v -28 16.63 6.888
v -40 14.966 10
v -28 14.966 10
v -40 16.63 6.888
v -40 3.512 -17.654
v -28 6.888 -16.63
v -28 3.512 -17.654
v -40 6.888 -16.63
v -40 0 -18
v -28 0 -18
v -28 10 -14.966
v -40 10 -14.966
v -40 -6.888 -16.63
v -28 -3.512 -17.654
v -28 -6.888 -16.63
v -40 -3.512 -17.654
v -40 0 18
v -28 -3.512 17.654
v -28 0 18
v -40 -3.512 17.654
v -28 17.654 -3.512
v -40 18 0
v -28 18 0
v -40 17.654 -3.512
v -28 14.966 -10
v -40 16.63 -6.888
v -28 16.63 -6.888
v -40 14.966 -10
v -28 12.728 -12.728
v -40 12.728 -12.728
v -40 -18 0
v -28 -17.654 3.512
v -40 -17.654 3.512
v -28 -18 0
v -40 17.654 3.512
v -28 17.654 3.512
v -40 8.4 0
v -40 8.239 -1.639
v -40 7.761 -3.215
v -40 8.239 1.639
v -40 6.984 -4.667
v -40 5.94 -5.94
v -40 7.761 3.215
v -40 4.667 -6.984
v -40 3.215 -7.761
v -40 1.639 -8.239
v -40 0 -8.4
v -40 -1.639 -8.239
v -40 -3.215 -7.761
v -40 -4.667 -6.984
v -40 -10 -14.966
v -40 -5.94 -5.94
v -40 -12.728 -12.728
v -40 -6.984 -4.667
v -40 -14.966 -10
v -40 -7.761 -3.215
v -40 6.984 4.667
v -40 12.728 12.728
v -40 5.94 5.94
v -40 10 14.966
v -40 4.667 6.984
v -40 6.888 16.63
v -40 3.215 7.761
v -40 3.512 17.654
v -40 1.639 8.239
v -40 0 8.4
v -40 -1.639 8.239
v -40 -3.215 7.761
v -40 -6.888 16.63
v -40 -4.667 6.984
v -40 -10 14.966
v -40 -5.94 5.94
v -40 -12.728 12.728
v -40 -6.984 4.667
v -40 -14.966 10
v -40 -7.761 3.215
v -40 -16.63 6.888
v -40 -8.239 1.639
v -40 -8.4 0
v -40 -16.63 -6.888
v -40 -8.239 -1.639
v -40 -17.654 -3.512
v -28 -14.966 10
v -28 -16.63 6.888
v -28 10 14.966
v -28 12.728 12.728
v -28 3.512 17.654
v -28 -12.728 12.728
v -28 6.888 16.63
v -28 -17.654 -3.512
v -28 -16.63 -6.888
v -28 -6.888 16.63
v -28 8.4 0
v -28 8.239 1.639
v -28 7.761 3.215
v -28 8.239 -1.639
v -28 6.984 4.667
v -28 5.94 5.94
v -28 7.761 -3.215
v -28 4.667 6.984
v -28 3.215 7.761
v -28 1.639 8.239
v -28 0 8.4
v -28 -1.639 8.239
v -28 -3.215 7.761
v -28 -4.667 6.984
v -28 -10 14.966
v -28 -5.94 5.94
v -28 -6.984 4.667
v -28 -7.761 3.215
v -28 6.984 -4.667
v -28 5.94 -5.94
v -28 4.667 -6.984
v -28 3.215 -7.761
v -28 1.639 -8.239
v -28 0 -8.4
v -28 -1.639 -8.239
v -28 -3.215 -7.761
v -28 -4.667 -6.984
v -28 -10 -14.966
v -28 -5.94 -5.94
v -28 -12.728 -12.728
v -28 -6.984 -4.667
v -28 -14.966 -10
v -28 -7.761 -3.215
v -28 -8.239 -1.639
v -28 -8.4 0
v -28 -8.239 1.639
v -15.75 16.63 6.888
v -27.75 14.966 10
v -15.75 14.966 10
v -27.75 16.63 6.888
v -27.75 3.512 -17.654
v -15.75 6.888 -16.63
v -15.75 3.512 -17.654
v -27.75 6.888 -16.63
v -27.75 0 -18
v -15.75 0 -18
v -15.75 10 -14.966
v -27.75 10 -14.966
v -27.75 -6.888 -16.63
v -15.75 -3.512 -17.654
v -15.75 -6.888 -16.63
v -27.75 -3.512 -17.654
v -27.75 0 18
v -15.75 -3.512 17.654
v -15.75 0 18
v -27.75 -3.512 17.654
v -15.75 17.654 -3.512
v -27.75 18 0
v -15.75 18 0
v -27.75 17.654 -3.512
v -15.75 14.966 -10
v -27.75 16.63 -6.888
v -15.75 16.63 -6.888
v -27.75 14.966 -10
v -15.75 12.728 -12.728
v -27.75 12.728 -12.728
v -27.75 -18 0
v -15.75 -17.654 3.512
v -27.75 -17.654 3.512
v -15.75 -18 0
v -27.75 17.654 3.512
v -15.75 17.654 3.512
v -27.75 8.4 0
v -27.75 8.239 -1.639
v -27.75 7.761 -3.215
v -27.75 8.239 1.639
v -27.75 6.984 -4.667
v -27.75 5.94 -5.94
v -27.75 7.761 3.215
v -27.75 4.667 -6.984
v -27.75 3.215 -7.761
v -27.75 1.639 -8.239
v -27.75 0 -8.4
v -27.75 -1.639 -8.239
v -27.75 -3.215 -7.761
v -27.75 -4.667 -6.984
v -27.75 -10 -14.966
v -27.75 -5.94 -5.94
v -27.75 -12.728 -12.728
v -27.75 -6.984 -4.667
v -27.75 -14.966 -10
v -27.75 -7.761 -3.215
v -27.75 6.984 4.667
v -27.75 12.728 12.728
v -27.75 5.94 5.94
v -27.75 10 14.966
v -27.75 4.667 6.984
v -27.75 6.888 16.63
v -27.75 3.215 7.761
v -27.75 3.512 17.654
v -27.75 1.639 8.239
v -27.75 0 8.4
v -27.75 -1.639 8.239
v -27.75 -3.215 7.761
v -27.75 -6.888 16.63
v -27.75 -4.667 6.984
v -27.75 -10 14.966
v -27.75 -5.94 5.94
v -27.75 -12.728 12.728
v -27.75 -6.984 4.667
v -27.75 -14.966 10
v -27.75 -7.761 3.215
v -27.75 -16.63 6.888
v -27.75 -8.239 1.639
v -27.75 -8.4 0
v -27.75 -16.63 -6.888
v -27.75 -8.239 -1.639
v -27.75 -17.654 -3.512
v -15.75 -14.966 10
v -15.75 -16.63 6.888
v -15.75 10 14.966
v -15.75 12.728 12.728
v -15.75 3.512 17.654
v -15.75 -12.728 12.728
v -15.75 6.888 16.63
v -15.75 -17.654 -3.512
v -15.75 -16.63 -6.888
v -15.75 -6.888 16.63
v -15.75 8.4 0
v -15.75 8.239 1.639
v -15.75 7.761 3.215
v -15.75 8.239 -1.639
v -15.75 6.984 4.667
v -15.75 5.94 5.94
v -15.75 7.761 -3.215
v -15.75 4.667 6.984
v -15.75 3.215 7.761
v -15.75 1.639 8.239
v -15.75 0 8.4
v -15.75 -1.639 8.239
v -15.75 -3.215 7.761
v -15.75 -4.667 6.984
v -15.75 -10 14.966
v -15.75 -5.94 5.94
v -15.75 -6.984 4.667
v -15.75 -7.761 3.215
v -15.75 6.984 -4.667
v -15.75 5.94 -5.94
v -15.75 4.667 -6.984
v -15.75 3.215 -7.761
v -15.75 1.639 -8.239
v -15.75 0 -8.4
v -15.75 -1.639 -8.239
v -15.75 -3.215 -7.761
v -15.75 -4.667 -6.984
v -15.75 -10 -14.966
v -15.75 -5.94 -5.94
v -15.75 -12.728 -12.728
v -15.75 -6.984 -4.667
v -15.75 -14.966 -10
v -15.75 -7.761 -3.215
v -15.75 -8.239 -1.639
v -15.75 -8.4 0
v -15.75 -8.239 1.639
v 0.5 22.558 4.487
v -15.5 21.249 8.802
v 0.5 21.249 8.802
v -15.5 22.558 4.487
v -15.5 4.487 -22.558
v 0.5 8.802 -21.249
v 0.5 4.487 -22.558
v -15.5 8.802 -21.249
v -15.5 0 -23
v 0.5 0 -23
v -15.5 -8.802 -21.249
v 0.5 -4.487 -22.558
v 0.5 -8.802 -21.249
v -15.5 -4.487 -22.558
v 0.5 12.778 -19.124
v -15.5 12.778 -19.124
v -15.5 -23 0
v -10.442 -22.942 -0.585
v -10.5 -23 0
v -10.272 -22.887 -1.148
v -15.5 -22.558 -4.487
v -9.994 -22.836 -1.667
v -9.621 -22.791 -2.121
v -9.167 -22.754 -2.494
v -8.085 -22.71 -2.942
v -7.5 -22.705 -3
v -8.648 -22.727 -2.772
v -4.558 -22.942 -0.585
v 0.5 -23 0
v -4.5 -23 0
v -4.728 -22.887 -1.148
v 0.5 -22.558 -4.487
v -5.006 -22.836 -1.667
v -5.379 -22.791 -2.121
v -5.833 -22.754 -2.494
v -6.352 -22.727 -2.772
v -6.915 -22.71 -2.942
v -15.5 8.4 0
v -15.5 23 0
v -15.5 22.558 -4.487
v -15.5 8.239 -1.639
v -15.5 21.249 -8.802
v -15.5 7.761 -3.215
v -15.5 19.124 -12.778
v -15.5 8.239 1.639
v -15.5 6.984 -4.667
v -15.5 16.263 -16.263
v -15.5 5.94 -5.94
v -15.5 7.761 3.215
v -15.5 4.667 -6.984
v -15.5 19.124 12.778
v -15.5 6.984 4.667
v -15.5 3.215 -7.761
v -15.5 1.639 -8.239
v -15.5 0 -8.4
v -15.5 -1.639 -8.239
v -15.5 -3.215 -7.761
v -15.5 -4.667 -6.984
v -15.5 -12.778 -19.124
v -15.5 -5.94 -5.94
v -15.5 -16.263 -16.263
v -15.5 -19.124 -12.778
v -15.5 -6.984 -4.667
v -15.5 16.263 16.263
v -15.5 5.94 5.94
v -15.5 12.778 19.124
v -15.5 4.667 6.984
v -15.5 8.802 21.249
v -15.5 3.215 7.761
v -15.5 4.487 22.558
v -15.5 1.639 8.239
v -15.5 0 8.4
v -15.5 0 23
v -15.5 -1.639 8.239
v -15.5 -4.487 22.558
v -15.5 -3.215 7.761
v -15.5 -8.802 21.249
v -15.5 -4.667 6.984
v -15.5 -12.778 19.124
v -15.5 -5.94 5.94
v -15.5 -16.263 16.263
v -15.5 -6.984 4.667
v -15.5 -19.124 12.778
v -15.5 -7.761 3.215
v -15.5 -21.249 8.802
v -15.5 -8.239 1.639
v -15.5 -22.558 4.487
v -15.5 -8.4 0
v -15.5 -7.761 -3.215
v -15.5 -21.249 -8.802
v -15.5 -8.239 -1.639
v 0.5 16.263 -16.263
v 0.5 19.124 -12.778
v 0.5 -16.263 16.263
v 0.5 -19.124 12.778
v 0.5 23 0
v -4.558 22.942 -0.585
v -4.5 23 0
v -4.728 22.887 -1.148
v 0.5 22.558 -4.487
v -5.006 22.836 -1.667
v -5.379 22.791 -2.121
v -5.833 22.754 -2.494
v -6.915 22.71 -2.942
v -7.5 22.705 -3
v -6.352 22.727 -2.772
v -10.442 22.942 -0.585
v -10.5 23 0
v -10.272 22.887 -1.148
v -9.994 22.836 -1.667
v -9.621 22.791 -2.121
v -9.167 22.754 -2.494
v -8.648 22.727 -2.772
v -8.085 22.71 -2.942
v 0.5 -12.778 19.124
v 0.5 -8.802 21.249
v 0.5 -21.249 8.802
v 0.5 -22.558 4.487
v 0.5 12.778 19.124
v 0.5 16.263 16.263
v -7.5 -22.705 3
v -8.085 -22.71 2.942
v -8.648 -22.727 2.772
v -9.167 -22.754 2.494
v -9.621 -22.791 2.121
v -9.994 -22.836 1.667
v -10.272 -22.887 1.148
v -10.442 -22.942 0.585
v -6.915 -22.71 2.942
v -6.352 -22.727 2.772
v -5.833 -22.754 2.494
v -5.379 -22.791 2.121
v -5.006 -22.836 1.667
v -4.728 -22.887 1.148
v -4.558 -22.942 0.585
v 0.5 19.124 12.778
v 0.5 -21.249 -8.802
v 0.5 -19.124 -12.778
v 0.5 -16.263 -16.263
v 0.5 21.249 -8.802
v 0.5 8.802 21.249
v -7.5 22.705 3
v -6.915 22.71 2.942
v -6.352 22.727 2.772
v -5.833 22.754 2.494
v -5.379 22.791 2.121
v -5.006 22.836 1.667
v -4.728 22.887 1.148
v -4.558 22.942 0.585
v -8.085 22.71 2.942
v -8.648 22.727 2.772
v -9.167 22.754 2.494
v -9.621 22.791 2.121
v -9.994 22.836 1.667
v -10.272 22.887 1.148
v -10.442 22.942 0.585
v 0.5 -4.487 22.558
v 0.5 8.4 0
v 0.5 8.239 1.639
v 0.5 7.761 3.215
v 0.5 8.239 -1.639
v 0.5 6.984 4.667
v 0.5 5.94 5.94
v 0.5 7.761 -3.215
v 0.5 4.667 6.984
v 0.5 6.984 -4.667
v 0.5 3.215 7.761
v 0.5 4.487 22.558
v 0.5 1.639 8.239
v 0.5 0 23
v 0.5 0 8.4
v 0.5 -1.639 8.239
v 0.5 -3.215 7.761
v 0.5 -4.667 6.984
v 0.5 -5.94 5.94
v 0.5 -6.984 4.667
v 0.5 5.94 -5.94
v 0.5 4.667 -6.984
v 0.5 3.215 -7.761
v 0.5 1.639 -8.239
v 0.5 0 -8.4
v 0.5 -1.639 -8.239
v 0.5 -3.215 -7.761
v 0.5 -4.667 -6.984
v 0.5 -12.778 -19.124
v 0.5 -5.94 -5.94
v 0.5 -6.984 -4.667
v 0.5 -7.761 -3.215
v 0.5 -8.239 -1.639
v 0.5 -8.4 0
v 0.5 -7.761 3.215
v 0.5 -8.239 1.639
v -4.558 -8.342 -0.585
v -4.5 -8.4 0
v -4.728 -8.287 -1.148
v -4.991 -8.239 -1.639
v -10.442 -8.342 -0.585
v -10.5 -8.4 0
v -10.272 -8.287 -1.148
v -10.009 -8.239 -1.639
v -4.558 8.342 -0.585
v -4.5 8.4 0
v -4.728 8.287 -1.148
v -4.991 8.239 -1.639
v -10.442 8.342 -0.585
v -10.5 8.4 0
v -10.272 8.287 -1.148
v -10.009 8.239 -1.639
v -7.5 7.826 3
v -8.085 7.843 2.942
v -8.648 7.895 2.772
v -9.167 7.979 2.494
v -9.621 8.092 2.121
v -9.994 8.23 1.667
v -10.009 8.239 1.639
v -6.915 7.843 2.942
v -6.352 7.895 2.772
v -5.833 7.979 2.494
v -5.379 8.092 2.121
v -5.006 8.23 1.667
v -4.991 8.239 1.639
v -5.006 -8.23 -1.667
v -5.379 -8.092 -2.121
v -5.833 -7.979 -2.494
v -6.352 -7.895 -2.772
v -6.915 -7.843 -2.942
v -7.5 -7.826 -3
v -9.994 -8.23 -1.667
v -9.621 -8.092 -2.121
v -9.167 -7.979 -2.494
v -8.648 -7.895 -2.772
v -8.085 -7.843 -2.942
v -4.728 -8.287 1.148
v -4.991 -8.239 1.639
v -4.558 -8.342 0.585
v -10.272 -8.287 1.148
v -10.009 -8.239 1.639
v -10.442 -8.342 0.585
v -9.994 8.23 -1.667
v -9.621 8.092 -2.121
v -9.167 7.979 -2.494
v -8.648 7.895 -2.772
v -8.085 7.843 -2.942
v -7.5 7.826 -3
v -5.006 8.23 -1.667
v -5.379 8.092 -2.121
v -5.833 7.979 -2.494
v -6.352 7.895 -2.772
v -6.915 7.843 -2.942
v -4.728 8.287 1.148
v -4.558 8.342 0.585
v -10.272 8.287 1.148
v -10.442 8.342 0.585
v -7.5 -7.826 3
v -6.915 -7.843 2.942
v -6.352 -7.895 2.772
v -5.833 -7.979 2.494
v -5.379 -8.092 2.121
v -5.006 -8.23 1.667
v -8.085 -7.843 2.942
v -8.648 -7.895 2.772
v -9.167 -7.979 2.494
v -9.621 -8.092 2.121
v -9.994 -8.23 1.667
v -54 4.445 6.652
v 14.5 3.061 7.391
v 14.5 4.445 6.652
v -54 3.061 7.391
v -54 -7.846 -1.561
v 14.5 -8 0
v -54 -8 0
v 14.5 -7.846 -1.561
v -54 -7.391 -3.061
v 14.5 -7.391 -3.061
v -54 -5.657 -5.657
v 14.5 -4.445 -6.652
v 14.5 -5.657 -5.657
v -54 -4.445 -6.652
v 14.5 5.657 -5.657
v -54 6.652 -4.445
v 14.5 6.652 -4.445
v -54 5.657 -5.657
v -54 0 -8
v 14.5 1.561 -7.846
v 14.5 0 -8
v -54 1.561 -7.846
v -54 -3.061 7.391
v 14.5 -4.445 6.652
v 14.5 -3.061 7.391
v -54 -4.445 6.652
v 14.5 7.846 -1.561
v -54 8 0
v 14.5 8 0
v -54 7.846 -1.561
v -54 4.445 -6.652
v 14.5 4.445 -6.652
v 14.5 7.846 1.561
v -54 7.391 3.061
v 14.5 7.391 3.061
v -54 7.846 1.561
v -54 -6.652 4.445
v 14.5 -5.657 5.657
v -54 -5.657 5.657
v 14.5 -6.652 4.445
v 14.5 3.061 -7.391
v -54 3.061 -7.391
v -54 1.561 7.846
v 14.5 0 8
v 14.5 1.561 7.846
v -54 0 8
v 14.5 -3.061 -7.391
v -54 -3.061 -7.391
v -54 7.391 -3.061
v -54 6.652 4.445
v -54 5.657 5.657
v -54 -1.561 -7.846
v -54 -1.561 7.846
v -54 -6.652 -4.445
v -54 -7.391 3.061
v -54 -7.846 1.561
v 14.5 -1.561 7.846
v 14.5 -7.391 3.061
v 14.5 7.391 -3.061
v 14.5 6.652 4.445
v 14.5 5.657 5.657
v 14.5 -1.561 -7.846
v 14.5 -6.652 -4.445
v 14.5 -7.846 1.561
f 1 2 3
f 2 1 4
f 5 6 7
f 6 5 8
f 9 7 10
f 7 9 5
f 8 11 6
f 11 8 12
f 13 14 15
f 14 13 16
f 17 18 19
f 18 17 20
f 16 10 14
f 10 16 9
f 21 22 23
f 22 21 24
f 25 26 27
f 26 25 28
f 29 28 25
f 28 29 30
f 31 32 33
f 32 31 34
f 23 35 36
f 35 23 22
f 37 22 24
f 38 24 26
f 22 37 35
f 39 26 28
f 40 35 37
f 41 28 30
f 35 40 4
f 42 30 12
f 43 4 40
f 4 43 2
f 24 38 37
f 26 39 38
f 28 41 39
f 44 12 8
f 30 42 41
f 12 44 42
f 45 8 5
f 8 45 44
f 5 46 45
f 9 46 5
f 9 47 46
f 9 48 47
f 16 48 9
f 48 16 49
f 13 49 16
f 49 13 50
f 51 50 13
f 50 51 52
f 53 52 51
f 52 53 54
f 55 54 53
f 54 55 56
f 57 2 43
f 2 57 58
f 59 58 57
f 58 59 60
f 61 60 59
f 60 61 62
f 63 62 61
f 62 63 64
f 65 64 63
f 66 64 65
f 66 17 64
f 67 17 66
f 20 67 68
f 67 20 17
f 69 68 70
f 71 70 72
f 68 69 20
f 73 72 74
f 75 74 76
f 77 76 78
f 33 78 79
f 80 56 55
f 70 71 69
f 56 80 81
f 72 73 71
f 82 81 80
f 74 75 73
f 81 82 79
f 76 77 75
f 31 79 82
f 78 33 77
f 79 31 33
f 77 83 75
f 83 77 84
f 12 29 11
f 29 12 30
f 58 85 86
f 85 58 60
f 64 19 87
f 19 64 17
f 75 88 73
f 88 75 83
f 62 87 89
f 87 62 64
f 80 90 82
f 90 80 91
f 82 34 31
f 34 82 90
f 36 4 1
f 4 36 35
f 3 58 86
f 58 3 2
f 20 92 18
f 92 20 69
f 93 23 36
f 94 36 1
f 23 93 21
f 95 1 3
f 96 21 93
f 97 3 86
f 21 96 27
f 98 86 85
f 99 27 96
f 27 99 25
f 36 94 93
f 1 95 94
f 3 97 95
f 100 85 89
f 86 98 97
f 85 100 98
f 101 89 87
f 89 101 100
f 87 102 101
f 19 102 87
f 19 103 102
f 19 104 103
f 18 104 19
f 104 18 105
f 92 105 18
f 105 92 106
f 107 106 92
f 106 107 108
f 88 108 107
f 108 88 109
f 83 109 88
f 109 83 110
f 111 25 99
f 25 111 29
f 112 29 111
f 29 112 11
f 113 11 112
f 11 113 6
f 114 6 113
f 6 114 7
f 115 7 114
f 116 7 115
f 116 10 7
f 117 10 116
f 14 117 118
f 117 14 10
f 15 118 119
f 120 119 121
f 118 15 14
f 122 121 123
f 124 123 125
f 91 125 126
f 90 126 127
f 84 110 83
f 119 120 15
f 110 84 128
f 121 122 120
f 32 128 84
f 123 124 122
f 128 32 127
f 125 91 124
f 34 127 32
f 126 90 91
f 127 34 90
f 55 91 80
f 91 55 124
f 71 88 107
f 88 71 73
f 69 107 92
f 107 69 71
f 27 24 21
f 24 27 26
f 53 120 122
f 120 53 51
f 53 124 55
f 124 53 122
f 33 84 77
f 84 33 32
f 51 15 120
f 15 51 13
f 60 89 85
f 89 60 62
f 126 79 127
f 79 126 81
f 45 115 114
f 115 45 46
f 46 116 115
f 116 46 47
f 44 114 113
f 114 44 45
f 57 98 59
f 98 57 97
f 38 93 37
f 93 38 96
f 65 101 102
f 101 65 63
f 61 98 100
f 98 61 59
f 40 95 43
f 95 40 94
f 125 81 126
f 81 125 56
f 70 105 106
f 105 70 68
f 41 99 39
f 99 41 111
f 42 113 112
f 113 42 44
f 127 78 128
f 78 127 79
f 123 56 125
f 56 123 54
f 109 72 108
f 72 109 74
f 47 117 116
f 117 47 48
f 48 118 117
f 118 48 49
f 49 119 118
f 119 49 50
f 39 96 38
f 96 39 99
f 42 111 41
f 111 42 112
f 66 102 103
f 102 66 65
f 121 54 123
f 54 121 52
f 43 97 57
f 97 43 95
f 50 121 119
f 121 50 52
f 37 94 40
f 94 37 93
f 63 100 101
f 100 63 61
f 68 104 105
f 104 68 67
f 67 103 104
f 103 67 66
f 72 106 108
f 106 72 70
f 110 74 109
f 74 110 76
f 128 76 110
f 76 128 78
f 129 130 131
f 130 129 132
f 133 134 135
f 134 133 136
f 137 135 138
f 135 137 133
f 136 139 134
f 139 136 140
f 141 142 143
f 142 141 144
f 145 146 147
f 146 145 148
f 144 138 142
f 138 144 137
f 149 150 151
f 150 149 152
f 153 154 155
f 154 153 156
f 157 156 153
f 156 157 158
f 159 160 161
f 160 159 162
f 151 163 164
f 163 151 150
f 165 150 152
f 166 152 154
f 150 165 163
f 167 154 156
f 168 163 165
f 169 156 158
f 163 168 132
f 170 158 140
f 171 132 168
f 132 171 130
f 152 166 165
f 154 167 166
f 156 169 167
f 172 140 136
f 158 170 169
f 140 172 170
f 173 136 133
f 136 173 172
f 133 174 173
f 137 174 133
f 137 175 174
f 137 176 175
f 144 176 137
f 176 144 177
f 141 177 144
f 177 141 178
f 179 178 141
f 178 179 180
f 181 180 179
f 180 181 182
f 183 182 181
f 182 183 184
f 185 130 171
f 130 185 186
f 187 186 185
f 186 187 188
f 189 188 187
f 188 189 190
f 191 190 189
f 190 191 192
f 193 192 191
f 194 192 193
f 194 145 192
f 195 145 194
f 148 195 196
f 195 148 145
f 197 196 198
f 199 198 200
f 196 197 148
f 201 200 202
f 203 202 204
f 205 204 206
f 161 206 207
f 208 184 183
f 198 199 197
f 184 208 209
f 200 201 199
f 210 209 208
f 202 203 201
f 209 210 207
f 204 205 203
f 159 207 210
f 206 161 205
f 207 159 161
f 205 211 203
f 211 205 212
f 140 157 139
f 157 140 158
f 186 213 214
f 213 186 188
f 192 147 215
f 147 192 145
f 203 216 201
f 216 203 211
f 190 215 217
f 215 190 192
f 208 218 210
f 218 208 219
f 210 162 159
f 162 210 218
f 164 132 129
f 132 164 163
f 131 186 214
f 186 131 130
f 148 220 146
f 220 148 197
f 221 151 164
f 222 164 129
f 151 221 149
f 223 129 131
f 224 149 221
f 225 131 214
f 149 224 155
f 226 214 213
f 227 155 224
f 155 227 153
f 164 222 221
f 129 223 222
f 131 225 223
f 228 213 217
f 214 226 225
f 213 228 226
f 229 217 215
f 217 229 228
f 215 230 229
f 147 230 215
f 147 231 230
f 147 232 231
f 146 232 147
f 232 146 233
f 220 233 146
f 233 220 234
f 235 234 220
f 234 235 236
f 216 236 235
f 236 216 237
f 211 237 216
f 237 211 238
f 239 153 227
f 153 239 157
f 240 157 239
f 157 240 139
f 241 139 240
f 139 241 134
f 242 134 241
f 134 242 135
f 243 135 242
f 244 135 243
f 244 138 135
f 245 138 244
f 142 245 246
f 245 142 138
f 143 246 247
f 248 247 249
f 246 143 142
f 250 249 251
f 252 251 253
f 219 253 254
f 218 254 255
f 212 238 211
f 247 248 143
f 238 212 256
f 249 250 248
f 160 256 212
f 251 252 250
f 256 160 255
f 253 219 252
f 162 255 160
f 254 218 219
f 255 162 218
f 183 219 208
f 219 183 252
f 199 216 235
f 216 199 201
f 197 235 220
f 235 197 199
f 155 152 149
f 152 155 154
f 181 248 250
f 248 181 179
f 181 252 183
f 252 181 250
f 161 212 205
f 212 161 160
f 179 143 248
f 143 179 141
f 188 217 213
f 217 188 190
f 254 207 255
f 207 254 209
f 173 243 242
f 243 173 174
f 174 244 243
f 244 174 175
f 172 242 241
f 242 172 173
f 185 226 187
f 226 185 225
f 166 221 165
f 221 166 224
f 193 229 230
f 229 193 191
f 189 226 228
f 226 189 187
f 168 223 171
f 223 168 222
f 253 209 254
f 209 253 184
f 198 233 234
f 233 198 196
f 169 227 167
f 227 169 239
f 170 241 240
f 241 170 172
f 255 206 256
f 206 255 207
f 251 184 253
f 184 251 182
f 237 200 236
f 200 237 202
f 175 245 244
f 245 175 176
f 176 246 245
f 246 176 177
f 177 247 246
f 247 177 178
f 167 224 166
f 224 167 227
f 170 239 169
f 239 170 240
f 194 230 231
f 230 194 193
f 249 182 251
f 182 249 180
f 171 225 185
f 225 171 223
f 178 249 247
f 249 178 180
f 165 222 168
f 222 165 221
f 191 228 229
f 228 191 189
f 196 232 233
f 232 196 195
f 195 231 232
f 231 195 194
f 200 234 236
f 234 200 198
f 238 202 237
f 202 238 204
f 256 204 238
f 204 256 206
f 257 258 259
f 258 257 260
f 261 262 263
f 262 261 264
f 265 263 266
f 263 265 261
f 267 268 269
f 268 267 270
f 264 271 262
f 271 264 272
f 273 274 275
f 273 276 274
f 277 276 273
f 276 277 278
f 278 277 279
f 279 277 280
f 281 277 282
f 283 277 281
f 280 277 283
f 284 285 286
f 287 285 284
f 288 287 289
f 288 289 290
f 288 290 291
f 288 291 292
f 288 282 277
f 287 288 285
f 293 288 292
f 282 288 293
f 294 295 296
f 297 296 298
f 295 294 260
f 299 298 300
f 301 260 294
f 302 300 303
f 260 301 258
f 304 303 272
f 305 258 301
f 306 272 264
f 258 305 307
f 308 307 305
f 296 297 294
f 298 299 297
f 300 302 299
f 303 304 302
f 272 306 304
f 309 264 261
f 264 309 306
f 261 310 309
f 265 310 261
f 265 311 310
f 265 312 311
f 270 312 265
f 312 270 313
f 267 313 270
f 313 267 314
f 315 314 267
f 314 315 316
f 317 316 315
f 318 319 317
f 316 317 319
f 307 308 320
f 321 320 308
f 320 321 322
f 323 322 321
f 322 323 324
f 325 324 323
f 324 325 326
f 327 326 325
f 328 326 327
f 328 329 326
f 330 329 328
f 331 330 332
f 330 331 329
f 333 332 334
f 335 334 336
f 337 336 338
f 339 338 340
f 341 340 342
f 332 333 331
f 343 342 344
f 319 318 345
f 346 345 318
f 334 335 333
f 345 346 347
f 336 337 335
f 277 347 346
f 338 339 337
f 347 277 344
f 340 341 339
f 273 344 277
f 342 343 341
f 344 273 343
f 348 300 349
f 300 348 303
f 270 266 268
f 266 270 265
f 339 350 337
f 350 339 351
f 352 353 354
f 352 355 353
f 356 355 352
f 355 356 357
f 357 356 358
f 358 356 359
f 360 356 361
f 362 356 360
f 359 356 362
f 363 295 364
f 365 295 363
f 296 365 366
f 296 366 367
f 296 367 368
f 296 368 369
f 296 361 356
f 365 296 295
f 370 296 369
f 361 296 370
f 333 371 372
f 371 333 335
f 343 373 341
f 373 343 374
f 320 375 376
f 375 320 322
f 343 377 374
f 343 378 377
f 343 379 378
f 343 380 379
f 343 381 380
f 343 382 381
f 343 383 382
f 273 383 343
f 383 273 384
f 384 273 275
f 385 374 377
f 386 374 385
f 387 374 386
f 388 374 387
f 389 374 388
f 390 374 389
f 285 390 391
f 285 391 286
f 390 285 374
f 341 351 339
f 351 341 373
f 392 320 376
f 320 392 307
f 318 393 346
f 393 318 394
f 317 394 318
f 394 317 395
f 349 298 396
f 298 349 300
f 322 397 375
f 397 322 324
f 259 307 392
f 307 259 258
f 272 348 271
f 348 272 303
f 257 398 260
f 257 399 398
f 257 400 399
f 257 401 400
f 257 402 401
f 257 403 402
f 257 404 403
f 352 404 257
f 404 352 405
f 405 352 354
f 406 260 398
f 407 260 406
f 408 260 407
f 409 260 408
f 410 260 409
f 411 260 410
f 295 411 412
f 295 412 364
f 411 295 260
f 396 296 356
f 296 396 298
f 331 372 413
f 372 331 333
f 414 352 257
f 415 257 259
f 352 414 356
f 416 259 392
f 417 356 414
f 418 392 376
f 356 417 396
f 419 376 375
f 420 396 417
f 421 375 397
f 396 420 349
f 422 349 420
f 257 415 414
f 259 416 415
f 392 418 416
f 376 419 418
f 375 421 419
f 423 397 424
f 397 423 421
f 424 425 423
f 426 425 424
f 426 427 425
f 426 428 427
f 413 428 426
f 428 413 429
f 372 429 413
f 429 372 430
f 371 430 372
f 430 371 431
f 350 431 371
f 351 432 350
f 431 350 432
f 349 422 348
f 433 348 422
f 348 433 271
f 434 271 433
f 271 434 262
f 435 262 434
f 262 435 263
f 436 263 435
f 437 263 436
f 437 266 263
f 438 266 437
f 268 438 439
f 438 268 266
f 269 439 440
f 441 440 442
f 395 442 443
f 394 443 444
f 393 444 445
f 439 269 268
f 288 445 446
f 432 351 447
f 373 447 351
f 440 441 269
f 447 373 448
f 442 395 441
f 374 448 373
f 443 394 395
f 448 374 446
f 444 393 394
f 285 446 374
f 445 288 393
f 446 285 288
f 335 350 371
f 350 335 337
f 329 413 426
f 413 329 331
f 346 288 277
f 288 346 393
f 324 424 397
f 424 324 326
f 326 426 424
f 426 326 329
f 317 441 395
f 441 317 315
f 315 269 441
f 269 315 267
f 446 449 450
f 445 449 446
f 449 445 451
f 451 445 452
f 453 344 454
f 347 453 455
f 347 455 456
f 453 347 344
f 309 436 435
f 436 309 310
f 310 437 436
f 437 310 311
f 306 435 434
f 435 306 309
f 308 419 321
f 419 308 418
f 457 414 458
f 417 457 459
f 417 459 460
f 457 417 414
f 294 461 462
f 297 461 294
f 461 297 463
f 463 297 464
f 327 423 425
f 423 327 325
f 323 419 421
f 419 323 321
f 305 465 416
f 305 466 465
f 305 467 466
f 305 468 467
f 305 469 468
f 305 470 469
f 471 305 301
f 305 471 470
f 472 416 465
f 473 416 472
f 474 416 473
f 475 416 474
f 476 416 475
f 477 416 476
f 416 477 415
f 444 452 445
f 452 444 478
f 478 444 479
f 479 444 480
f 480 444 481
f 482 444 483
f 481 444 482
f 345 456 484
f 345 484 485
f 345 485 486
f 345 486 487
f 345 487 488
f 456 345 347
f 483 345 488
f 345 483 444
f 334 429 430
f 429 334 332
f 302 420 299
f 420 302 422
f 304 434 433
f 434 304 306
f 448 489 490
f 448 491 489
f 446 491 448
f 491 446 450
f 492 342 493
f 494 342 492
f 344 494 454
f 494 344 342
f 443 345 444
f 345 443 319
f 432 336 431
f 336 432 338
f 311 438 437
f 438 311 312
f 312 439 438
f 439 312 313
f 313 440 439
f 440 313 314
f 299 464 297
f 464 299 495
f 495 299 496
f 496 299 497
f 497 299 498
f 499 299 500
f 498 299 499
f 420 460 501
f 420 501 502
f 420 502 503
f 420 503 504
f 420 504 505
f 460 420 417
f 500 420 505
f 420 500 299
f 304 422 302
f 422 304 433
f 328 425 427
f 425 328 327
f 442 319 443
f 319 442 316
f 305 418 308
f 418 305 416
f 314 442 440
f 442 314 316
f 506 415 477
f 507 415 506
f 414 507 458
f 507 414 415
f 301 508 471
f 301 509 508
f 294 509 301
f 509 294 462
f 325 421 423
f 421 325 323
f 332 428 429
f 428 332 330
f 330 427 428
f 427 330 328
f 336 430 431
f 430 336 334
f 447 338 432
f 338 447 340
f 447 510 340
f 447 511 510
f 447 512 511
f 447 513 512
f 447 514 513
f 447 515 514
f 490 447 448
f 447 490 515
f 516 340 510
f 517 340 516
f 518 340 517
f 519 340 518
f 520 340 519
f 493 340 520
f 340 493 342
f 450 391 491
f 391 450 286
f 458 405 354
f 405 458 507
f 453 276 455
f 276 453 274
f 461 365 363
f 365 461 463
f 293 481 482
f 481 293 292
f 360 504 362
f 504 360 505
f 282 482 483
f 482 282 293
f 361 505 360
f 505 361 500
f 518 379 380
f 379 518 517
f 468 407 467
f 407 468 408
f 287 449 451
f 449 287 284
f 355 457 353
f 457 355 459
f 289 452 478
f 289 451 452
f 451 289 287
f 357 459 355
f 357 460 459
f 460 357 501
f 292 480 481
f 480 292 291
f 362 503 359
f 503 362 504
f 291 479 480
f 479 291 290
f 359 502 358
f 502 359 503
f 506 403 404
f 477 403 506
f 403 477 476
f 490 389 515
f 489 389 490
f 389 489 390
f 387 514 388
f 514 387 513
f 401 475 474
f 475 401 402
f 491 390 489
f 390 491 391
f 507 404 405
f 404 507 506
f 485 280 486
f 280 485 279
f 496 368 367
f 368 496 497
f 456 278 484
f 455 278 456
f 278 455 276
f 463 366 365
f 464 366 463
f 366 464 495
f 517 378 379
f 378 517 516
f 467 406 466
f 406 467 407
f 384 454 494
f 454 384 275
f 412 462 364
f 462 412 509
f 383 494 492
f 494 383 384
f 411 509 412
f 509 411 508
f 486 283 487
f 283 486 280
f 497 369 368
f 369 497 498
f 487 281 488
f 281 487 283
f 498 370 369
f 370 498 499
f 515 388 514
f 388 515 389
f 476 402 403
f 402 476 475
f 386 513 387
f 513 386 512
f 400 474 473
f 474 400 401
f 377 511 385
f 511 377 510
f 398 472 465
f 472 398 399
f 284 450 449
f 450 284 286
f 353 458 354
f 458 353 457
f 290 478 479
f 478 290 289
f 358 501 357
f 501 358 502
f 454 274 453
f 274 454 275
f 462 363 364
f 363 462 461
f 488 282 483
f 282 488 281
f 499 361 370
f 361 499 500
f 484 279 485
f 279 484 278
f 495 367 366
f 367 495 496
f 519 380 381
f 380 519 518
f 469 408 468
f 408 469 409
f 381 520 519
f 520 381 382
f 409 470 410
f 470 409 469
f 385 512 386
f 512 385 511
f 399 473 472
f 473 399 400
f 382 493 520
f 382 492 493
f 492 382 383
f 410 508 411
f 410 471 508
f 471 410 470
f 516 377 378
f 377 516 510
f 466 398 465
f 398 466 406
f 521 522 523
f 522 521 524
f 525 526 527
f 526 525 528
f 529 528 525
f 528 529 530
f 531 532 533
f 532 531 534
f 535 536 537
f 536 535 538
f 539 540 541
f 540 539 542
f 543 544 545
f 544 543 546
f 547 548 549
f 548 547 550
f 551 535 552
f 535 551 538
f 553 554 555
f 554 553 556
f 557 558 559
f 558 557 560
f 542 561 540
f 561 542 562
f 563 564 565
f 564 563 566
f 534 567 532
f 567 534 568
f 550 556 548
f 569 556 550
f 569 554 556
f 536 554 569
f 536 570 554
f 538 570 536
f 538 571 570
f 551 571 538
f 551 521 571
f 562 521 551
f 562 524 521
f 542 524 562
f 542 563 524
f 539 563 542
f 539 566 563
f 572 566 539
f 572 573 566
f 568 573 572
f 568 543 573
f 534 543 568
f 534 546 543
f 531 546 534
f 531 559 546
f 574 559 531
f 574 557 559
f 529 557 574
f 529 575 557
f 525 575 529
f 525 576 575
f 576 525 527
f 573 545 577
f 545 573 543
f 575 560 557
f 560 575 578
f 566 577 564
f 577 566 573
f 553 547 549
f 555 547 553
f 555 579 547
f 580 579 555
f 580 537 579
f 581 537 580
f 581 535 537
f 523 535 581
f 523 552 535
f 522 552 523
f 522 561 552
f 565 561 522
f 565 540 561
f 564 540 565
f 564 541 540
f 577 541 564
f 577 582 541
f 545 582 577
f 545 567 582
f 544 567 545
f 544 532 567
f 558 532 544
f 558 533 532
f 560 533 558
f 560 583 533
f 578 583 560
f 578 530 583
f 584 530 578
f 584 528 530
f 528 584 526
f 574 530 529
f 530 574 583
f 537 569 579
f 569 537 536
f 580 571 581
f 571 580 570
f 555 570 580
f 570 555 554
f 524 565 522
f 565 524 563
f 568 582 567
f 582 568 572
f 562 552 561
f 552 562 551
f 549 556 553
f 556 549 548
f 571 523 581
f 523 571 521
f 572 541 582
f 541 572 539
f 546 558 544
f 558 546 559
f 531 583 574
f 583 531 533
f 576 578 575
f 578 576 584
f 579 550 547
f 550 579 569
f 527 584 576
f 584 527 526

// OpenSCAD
$fn = 32;

// ------------------------------------------------------------------------
// Shaft with rings and collars: d16 shaft, 3 rings
// Every part is its own module, assembly() places them once.
// ------------------------------------------------------------------------

// --- part 1 ---
module shaft() {
  translate([0, 0, -34.25]) cylinder(h = 68.5, d = 16);
}

// --- part 2 ---
module spacer_a() {
  difference() {
      translate([0, 0, 0]) cylinder(h = 12, d = 36);
      translate([0, 0, -1]) cylinder(h = 14, d = 16.8);
    }
}

// --- part 3 ---
module spacer_b() {
  difference() {
      translate([0, 0, 0]) cylinder(h = 12, d = 36);
      translate([0, 0, -1]) cylinder(h = 14, d = 16.8);
    }
}

// --- part 4 ---
module collar_a() {
  difference() {
    cylinder(h = 16, d = 46);
    translate([0, 0, -1]) cylinder(h = 18, d = 16.8);
    translate([0, 0, 8]) rotate([90, 0, 0]) cylinder(h = 48, d = 6, center = true);
  }
}

// --- assembly ---
module assembly() {
  translate([-19.75, 0, 0]) rotate([0, 90, 0]) shaft();
  translate([-40, 0, 0]) rotate([0, 90, 0]) spacer_a();
  translate([-27.75, 0, 0]) rotate([0, 90, 0]) spacer_b();
  translate([-15.5, 0, 0]) rotate([0, 90, 0]) collar_a();
}

assembly();
